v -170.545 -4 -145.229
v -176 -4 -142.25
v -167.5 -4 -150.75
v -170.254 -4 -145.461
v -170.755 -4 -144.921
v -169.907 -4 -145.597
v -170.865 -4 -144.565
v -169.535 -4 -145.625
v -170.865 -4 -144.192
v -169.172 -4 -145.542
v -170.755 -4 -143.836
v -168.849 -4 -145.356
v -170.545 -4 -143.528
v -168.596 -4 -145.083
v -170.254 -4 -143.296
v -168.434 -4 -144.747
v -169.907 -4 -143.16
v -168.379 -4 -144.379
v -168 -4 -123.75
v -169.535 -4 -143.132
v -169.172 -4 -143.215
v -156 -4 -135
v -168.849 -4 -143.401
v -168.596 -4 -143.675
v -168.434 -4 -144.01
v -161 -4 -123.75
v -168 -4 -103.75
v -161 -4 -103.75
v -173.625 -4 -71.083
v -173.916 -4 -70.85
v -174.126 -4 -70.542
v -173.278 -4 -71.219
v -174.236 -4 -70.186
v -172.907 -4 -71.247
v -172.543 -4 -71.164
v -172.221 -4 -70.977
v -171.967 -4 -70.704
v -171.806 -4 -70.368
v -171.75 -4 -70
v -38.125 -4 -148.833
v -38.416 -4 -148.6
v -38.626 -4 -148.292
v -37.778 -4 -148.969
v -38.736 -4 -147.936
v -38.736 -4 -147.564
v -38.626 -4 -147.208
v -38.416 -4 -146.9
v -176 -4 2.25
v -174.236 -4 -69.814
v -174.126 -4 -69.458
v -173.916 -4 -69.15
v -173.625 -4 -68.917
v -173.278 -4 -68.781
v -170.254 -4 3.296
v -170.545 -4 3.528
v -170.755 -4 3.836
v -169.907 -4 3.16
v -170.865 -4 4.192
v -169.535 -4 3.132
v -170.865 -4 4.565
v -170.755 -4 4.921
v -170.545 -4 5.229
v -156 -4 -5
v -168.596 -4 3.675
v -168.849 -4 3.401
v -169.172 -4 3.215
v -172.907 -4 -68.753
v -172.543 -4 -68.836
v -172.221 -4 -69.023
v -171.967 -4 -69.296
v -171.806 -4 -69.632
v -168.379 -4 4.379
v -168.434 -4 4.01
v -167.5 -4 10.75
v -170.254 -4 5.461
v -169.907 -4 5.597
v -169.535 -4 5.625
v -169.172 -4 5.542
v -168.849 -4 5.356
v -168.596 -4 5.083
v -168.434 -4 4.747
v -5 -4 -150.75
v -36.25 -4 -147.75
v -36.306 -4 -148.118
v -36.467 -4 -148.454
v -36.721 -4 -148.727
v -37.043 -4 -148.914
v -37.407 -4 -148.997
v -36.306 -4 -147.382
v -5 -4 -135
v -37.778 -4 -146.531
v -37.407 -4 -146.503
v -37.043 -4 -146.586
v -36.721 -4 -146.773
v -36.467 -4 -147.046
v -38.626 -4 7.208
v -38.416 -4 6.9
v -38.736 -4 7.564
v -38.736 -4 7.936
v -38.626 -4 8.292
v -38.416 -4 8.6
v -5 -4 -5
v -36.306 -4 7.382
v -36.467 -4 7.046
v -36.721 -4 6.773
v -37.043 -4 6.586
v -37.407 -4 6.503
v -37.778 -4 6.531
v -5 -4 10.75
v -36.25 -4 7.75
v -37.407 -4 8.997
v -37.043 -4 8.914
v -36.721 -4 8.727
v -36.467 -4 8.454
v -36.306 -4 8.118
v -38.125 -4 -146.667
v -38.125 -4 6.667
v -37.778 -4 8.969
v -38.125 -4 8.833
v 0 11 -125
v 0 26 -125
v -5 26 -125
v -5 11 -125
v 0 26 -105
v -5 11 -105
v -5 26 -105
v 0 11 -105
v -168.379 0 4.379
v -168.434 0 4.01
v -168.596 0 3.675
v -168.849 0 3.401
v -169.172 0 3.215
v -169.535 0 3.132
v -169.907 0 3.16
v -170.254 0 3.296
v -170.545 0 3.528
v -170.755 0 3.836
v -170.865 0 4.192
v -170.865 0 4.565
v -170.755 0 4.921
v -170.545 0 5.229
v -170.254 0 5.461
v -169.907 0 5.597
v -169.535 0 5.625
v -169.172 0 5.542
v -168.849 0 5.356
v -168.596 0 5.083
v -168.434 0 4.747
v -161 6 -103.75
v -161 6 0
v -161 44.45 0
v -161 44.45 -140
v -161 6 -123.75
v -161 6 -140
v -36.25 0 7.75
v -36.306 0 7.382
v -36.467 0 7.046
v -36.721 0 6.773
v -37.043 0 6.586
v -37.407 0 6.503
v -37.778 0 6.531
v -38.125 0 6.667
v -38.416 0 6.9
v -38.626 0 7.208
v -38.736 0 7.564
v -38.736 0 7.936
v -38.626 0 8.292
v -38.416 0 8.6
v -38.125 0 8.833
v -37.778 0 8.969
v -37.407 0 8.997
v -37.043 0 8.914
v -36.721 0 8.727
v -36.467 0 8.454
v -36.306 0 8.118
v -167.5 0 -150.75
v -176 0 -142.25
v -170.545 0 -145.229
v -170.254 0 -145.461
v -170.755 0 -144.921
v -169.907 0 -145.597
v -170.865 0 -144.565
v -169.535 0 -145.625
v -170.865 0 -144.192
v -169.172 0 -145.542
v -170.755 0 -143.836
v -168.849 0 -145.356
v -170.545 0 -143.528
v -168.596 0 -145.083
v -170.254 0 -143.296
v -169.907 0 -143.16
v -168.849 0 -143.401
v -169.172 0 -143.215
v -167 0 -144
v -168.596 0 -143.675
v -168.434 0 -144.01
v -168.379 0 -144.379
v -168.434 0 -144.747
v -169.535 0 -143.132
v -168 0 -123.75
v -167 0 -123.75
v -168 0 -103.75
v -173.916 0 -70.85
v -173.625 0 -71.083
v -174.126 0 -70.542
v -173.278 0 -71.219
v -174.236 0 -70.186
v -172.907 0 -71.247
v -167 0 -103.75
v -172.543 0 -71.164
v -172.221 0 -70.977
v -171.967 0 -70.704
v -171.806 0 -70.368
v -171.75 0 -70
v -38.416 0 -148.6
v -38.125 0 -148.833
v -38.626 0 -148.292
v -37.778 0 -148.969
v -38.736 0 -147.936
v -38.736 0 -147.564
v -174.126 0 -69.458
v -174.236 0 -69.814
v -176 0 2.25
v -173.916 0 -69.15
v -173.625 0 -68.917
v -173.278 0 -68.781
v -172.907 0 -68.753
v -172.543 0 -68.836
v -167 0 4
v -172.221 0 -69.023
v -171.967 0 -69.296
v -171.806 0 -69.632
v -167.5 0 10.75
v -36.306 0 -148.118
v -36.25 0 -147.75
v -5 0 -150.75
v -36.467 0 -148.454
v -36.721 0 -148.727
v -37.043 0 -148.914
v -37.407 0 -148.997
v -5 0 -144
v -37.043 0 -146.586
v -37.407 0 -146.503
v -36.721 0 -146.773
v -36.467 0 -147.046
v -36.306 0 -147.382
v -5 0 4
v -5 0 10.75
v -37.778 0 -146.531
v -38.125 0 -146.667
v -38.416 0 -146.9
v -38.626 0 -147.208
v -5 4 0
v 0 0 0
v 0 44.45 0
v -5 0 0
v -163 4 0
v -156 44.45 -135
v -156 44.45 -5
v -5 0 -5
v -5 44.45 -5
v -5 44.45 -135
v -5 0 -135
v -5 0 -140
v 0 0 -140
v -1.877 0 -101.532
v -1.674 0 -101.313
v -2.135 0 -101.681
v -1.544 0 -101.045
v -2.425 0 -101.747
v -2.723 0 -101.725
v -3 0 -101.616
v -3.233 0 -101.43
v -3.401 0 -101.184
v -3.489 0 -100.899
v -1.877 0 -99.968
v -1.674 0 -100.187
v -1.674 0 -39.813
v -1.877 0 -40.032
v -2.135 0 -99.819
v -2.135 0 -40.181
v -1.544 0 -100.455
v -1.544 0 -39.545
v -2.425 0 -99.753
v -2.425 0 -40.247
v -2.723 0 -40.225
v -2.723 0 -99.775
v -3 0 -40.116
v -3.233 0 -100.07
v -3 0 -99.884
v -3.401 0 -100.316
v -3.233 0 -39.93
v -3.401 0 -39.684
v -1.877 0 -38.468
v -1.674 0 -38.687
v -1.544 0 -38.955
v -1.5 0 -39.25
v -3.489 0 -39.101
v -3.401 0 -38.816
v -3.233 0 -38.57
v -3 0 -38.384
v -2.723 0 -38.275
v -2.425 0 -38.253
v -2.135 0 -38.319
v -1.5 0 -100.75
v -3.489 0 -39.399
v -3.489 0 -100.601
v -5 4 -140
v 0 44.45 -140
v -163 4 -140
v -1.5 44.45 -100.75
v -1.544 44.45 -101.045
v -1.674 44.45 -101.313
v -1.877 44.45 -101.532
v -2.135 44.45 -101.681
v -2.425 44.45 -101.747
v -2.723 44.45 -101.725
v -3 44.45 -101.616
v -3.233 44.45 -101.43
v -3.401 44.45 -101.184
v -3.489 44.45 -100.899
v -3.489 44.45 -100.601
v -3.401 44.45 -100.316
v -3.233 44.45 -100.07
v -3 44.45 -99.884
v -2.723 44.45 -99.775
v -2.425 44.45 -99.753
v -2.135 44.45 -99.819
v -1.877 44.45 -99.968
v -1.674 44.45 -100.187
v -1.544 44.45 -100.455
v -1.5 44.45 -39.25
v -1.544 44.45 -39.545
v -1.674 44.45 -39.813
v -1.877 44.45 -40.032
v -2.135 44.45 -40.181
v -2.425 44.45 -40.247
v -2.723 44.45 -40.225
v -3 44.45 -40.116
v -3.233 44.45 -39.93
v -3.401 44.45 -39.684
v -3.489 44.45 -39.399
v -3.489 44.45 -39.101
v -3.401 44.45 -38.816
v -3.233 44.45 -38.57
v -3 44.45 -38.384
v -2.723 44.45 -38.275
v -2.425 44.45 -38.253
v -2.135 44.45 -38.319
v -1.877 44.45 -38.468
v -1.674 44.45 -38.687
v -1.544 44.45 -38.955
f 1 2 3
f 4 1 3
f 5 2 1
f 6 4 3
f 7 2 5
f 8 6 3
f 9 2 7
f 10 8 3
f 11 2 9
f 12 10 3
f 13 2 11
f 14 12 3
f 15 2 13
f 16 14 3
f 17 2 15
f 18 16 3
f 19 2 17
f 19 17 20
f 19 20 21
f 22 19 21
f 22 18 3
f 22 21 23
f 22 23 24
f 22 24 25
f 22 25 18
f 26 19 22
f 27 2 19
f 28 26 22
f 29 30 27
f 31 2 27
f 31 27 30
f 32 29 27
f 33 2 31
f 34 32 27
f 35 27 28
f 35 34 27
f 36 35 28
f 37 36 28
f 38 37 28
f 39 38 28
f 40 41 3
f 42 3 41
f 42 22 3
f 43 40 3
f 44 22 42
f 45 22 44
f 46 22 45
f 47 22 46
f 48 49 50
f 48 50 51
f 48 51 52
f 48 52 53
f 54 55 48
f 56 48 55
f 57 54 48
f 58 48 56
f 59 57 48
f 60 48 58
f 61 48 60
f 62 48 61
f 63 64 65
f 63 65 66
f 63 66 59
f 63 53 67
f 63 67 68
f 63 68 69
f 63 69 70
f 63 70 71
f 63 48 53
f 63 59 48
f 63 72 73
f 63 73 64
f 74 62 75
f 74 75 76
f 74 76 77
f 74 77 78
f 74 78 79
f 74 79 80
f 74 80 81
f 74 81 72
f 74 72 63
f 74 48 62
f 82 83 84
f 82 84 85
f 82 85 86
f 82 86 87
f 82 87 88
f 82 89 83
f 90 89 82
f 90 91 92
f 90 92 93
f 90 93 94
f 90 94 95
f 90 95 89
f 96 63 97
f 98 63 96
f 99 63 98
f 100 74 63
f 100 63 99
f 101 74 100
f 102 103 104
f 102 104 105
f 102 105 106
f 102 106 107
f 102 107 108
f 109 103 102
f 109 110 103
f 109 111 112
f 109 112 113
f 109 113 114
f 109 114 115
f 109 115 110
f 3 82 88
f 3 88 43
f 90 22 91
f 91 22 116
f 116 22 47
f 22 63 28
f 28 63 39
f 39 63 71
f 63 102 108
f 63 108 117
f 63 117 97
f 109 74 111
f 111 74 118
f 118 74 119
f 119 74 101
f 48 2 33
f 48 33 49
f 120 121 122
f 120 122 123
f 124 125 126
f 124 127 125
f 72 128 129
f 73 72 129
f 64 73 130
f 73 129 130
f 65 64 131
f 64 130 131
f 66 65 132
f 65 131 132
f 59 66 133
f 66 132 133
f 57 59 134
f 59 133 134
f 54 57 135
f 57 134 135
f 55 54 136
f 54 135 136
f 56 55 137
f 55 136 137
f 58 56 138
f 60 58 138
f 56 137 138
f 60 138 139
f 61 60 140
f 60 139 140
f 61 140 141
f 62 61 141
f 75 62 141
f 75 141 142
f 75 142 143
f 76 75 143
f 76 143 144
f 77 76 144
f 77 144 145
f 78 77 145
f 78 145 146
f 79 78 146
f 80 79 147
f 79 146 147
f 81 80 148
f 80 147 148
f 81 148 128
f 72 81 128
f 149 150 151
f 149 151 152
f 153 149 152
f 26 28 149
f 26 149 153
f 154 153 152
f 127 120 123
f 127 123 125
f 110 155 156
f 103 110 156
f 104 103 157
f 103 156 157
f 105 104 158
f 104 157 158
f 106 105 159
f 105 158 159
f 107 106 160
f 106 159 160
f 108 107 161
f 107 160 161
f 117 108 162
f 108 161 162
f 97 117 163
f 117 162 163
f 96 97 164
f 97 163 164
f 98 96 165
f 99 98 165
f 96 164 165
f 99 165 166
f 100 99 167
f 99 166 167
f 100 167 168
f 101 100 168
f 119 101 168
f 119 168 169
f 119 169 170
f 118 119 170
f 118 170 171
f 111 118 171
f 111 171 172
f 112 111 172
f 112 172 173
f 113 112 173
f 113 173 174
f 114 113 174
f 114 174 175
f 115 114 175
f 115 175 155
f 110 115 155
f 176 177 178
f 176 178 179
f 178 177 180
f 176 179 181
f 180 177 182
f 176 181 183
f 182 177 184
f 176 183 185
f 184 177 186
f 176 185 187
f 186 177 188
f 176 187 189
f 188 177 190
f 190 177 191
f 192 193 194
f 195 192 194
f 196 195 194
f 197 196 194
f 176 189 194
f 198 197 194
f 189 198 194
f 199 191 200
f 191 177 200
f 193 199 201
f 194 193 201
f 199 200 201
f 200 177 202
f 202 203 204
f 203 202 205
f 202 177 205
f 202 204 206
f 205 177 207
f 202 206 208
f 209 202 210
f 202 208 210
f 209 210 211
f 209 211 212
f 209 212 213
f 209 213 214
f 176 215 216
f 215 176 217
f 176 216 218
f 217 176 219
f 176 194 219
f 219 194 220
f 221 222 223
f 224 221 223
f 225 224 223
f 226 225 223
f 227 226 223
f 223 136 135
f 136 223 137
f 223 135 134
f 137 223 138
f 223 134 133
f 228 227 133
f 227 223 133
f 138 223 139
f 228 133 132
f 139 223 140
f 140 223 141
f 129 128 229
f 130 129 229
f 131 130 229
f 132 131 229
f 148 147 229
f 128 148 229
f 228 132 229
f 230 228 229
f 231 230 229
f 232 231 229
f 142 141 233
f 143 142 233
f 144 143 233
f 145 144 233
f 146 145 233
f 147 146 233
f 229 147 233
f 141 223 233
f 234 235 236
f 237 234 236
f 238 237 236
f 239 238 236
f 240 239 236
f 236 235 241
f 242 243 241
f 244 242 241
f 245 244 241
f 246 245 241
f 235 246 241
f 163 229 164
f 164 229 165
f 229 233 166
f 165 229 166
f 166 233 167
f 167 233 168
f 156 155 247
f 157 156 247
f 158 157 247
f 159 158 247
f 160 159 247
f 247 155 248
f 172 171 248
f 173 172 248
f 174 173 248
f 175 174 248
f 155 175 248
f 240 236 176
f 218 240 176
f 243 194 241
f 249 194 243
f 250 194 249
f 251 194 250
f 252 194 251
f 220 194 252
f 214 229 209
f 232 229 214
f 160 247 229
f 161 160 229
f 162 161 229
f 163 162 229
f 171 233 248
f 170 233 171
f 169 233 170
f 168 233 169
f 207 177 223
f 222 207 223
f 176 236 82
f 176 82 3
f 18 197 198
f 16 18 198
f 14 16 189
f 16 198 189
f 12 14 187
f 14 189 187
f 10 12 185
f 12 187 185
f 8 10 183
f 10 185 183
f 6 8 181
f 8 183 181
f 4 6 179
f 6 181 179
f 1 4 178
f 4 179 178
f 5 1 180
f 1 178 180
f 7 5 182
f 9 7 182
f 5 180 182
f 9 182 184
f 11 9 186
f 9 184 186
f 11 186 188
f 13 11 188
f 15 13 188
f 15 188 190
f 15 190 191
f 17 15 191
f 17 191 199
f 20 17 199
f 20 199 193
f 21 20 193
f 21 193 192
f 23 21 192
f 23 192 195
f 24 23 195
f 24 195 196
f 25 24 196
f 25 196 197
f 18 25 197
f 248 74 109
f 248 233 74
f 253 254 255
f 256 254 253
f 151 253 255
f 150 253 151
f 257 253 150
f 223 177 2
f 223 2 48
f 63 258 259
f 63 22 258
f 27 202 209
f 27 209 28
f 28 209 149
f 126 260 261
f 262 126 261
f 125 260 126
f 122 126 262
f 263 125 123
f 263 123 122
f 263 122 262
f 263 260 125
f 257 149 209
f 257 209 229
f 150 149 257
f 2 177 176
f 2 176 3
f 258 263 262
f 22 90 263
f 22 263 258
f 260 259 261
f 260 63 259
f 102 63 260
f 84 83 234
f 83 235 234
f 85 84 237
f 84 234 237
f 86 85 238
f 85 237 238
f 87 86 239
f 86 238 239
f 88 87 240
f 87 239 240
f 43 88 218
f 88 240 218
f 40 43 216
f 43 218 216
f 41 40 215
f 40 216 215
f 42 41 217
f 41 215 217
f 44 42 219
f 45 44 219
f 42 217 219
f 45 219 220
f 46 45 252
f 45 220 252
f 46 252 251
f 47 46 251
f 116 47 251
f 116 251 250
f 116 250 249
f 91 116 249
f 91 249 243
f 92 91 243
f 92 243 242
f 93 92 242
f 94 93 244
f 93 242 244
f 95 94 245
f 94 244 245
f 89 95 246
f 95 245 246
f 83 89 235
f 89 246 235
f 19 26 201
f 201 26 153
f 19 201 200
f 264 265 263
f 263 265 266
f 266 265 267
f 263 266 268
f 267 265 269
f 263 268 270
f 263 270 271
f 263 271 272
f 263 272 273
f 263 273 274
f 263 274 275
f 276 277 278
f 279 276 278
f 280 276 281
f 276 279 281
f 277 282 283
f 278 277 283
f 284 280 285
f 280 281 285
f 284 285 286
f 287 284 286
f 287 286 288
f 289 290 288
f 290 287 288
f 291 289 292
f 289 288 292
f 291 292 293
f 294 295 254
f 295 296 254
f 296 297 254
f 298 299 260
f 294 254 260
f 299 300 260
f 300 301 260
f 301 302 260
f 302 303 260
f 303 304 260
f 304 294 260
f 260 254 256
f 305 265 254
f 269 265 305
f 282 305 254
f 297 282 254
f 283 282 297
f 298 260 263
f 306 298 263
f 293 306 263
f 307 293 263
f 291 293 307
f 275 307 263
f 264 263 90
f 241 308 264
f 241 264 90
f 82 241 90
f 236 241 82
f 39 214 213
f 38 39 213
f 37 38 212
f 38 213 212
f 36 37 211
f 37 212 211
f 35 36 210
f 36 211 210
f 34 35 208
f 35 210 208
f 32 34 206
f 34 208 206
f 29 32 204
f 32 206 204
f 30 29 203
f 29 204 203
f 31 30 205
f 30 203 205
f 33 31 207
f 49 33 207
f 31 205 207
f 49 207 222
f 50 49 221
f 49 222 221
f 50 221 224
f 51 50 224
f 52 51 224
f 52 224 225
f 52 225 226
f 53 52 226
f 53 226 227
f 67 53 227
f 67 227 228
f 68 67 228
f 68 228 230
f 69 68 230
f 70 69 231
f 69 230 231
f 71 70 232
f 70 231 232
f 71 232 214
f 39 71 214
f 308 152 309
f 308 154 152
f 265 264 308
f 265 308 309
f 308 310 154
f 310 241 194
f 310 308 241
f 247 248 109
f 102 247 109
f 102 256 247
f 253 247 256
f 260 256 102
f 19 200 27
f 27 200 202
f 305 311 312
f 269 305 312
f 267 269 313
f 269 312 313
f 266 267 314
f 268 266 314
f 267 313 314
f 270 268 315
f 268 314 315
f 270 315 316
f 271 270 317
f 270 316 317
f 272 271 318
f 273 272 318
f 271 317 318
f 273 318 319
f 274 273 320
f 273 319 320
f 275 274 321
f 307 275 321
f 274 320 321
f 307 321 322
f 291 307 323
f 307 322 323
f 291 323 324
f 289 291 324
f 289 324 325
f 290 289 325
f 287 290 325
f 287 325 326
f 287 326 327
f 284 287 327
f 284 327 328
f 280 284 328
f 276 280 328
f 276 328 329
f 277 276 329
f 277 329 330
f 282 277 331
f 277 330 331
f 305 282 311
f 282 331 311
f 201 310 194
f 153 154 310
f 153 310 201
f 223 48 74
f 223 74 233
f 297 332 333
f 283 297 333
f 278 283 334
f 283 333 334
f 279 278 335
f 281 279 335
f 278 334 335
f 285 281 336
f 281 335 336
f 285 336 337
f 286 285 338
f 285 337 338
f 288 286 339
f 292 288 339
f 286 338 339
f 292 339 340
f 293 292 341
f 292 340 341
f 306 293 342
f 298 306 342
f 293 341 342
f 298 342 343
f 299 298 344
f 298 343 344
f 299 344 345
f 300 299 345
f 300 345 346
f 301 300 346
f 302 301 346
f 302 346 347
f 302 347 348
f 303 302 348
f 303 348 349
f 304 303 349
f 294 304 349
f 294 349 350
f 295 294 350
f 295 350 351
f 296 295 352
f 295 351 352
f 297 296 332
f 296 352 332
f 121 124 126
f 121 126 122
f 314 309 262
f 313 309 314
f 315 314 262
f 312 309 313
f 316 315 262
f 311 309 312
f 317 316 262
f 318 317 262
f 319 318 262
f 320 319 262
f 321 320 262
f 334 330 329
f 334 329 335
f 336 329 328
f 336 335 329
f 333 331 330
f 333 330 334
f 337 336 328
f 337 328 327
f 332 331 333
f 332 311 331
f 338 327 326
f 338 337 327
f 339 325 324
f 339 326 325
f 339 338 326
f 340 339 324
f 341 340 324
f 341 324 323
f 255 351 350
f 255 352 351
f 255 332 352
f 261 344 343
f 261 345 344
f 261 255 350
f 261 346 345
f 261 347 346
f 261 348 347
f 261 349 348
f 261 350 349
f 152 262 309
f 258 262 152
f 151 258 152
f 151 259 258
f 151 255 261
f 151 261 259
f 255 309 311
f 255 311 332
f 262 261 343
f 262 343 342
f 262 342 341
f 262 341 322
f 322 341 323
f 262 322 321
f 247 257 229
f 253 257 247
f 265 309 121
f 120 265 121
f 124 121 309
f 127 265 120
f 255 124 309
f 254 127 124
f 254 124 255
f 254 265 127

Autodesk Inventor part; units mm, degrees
ref_plane "YZ Plane" through (0, 0, 0) normal (1, 0, 0) x (0, 1, 0)
ref_plane "XZ Plane" through (0, 0, 0) normal (0, 1, 0) x (-1, 0, 0)
ref_plane "XY Plane" through (0, 0, 0) normal (0, 0, 1) x (1, 0, 0)
sketch "Sketch1" plane through (0, 0, 0) normal (0, 1, 0) x (-1, 0, 0)
  line L0 (0, 0) -> (161, 0)
  line L1 (161, 0) -> (161, -140)
  line L2 (161, -140) -> (0, -140)
  line L3 (0, -140) -> (0, 0)
  line L4 (156, -135) -> (156, -5)
  line L5 (156, -5) -> (5, -5)
  line L6 (5, -5) -> (5, -135)
  line L7 (5, -135) -> (156, -135)
  dimension "d28" = 151
  dimension "d29" = 130
  dimension "d30" = 5
extrude "Extrusion1" add sketch "Sketch1" along normal blind 44.45
sketch "Sketch2" plane through (0, 0, 0) normal (0, -1, 0) x (1, 0, 0)
  line L0 (-176, 10.75) -> (-5, 10.75)
  line L1 (-5, -150.75) -> (-176, -150.75)
  line L2 (-176, -150.75) -> (-176, 10.75)
  line L3 (-161, 0) -> (0, 0) projected
  line L4 (0, -140) -> (-161, -140) projected
  line L5 (-161, -140) -> (-161, 0) projected
  line L6 (0, -140) -> (-161, -140) projected
  line L7 (0, 0) -> (0, -140) projected
  line L8 (-161, 0) -> (0, 0) projected
  line L9 (-161, -140) -> (-161, 0) projected
  line L10 (-156, -135) -> (-5, -135) projected
  line L11 (-156, -5) -> (-156, -135) projected
  line L12 (-5, -5) -> (-156, -5) projected
  line L13 (-5, -135) -> (-5, -5) projected
  line L14 (-5, 10.75) -> (-5, -5)
  line L15 (-5, -135) -> (-5, -150.75)
  dimension "d31" = 161.5
  dimension "d32" = 171
extrude "Extrusion2" add sketch "Sketch2" along normal blind 4 contours L0 L14 L3 L5 L4 L15 L1 L2 | L14 L12 L11 L10 L15 L4 L5 L3
chamfer "Chamfer1" distance 8.5 angle 45 2 edges at (-176, -2, 10.75) (-176, -2, -150.75)
sketch "Sketch3" plane through (0, 0, 0) normal (0, 1, 0) x (1, 0, 0)
  circle A0 centre (-169.6287, -4.3787) radius 1.25
  circle A1 centre (-37.5, -7.75) radius 1.25
  circle A2 centre (-173, 70) radius 1.25
  circle A3 centre (-169.6287, 144.3787) radius 1.25
  circle A4 centre (-37.5, 147.75) radius 1.25
  line L0 (-176, -10.75) -> (-176, 150.75) projected
  line L1 (-5, -10.75) -> (-176, -10.75) projected
  line L2 (-176, 150.75) -> (-5, 150.75) projected
  line L3 (-161, 123.75) -> (-168, 123.75)
  line L4 (-168, 123.75) -> (-168, 103.75)
  line L5 (-168, 103.75) -> (-161, 103.75)
  line L6 (-161, 103.75) -> (-161, 123.75)
  line L7 (-167.5, -10.75) -> (-176, -2.25) projected
  line L8 (-176, 142.25) -> (-167.5, 150.75) projected
  line L9 (-171.75, -6.5) -> (-169.6287, -4.3787) construction
  line L10 (-171.75, 146.5) -> (-169.6287, 144.3787) construction
  point P0 (0, 0)
  point P1 (-176, 70)
  point P2 (-176, 70)
  point P3 (-164.5, 103.75)
  point P4 (-164.5, 123.75)
  point P5 (-168, 113.75)
  point P6 (-161, 113.75)
  dimension "d10" = 2.5
  dimension "d11" = 2.5
  dimension "d12" = 2.5
  dimension "d13" = 2.5
  dimension "d14" = 2.5
  dimension "d33" = 138.5
  dimension "d35" = 3
  dimension "d37" = 3
  dimension "d38" = 3
  dimension "d58" = 3
  dimension "d59" = 3
  dimension "d60" = 20
  dimension "d61" = 7
  dimension "d62" = 8
  dimension "d63" = 27
extrude "Extrusion3" cut sketch "Sketch3" against normal blind 11.1125 contours A0 | A1 | A2 | A3 | A4 | L6 L5 L4 L3
sketch "Sketch4" plane through (0, 44.45, 0) normal (0, 1, 0) x (1, 0, 0)
  circle A0 centre (-2.5, 100.75) radius 1
  circle A1 centre (-2.5, 39.25) radius 1
  line L0 (-161, 0) -> (0, 0) projected
  line L1 (0, 140) -> (-161, 140) projected
  line L2 (0, 140) -> (-5, 140) projected
  line L3 (-167.5, 150.75) -> (-5, 150.75) projected
  line L4 (-5, -10.75) -> (-167.5, -10.75) projected
  point P0 (-2.5, 140)
  dimension "d20" = 2
  dimension "d39" = 50
  dimension "d51" = 50
extrude "Extrusion4" cut sketch "Sketch4" against normal blind 65.0875
chamfer "Chamfer2" distance 4 angle 45 2 edges at (-83, 0, 0) (-83, 0, -140)
chamfer "Chamfer3" distance 6 angle 45 2 edges at (-161, 0, -51.875) (-161, 0, -131.875)
sketch "Sketch6" plane through (0, 0, 0) normal (1, 0, 0) x (0, 0, -1)
  line L0 (105, 26) -> (125, 26)
  line L1 (125, 26) -> (125, 11)
  line L2 (125, 11) -> (105, 11)
  line L3 (105, 11) -> (105, 26)
  line L4 (5, -4) -> (-10.75, -4) projected
  line L5 (0, 0) -> (0, 44.45) projected
  line L6 (140, 0) -> (140, 44.45) projected
  point P0 (125, 18.5)
  point P1 (105, 18.5)
  dimension "d64" = 15
  dimension "d65" = 15
  dimension "d66" = 20
  dimension "d70" = 15
extrude "Extrusion6" cut sketch "Sketch6" against normal blind 9.05
equation "\"d11\" = d10"
equation "\"d12\" = d11"
equation "\"d13\" = d12"
equation "\"d14\" = d12"
equation "\"d35\" = d34"
equation "\"d37\" = d36"
equation "\"d38\" = d34"
equation "\"d36\" = d34"
equation "\"d34\" = 3"
properties part number "battery holder"
